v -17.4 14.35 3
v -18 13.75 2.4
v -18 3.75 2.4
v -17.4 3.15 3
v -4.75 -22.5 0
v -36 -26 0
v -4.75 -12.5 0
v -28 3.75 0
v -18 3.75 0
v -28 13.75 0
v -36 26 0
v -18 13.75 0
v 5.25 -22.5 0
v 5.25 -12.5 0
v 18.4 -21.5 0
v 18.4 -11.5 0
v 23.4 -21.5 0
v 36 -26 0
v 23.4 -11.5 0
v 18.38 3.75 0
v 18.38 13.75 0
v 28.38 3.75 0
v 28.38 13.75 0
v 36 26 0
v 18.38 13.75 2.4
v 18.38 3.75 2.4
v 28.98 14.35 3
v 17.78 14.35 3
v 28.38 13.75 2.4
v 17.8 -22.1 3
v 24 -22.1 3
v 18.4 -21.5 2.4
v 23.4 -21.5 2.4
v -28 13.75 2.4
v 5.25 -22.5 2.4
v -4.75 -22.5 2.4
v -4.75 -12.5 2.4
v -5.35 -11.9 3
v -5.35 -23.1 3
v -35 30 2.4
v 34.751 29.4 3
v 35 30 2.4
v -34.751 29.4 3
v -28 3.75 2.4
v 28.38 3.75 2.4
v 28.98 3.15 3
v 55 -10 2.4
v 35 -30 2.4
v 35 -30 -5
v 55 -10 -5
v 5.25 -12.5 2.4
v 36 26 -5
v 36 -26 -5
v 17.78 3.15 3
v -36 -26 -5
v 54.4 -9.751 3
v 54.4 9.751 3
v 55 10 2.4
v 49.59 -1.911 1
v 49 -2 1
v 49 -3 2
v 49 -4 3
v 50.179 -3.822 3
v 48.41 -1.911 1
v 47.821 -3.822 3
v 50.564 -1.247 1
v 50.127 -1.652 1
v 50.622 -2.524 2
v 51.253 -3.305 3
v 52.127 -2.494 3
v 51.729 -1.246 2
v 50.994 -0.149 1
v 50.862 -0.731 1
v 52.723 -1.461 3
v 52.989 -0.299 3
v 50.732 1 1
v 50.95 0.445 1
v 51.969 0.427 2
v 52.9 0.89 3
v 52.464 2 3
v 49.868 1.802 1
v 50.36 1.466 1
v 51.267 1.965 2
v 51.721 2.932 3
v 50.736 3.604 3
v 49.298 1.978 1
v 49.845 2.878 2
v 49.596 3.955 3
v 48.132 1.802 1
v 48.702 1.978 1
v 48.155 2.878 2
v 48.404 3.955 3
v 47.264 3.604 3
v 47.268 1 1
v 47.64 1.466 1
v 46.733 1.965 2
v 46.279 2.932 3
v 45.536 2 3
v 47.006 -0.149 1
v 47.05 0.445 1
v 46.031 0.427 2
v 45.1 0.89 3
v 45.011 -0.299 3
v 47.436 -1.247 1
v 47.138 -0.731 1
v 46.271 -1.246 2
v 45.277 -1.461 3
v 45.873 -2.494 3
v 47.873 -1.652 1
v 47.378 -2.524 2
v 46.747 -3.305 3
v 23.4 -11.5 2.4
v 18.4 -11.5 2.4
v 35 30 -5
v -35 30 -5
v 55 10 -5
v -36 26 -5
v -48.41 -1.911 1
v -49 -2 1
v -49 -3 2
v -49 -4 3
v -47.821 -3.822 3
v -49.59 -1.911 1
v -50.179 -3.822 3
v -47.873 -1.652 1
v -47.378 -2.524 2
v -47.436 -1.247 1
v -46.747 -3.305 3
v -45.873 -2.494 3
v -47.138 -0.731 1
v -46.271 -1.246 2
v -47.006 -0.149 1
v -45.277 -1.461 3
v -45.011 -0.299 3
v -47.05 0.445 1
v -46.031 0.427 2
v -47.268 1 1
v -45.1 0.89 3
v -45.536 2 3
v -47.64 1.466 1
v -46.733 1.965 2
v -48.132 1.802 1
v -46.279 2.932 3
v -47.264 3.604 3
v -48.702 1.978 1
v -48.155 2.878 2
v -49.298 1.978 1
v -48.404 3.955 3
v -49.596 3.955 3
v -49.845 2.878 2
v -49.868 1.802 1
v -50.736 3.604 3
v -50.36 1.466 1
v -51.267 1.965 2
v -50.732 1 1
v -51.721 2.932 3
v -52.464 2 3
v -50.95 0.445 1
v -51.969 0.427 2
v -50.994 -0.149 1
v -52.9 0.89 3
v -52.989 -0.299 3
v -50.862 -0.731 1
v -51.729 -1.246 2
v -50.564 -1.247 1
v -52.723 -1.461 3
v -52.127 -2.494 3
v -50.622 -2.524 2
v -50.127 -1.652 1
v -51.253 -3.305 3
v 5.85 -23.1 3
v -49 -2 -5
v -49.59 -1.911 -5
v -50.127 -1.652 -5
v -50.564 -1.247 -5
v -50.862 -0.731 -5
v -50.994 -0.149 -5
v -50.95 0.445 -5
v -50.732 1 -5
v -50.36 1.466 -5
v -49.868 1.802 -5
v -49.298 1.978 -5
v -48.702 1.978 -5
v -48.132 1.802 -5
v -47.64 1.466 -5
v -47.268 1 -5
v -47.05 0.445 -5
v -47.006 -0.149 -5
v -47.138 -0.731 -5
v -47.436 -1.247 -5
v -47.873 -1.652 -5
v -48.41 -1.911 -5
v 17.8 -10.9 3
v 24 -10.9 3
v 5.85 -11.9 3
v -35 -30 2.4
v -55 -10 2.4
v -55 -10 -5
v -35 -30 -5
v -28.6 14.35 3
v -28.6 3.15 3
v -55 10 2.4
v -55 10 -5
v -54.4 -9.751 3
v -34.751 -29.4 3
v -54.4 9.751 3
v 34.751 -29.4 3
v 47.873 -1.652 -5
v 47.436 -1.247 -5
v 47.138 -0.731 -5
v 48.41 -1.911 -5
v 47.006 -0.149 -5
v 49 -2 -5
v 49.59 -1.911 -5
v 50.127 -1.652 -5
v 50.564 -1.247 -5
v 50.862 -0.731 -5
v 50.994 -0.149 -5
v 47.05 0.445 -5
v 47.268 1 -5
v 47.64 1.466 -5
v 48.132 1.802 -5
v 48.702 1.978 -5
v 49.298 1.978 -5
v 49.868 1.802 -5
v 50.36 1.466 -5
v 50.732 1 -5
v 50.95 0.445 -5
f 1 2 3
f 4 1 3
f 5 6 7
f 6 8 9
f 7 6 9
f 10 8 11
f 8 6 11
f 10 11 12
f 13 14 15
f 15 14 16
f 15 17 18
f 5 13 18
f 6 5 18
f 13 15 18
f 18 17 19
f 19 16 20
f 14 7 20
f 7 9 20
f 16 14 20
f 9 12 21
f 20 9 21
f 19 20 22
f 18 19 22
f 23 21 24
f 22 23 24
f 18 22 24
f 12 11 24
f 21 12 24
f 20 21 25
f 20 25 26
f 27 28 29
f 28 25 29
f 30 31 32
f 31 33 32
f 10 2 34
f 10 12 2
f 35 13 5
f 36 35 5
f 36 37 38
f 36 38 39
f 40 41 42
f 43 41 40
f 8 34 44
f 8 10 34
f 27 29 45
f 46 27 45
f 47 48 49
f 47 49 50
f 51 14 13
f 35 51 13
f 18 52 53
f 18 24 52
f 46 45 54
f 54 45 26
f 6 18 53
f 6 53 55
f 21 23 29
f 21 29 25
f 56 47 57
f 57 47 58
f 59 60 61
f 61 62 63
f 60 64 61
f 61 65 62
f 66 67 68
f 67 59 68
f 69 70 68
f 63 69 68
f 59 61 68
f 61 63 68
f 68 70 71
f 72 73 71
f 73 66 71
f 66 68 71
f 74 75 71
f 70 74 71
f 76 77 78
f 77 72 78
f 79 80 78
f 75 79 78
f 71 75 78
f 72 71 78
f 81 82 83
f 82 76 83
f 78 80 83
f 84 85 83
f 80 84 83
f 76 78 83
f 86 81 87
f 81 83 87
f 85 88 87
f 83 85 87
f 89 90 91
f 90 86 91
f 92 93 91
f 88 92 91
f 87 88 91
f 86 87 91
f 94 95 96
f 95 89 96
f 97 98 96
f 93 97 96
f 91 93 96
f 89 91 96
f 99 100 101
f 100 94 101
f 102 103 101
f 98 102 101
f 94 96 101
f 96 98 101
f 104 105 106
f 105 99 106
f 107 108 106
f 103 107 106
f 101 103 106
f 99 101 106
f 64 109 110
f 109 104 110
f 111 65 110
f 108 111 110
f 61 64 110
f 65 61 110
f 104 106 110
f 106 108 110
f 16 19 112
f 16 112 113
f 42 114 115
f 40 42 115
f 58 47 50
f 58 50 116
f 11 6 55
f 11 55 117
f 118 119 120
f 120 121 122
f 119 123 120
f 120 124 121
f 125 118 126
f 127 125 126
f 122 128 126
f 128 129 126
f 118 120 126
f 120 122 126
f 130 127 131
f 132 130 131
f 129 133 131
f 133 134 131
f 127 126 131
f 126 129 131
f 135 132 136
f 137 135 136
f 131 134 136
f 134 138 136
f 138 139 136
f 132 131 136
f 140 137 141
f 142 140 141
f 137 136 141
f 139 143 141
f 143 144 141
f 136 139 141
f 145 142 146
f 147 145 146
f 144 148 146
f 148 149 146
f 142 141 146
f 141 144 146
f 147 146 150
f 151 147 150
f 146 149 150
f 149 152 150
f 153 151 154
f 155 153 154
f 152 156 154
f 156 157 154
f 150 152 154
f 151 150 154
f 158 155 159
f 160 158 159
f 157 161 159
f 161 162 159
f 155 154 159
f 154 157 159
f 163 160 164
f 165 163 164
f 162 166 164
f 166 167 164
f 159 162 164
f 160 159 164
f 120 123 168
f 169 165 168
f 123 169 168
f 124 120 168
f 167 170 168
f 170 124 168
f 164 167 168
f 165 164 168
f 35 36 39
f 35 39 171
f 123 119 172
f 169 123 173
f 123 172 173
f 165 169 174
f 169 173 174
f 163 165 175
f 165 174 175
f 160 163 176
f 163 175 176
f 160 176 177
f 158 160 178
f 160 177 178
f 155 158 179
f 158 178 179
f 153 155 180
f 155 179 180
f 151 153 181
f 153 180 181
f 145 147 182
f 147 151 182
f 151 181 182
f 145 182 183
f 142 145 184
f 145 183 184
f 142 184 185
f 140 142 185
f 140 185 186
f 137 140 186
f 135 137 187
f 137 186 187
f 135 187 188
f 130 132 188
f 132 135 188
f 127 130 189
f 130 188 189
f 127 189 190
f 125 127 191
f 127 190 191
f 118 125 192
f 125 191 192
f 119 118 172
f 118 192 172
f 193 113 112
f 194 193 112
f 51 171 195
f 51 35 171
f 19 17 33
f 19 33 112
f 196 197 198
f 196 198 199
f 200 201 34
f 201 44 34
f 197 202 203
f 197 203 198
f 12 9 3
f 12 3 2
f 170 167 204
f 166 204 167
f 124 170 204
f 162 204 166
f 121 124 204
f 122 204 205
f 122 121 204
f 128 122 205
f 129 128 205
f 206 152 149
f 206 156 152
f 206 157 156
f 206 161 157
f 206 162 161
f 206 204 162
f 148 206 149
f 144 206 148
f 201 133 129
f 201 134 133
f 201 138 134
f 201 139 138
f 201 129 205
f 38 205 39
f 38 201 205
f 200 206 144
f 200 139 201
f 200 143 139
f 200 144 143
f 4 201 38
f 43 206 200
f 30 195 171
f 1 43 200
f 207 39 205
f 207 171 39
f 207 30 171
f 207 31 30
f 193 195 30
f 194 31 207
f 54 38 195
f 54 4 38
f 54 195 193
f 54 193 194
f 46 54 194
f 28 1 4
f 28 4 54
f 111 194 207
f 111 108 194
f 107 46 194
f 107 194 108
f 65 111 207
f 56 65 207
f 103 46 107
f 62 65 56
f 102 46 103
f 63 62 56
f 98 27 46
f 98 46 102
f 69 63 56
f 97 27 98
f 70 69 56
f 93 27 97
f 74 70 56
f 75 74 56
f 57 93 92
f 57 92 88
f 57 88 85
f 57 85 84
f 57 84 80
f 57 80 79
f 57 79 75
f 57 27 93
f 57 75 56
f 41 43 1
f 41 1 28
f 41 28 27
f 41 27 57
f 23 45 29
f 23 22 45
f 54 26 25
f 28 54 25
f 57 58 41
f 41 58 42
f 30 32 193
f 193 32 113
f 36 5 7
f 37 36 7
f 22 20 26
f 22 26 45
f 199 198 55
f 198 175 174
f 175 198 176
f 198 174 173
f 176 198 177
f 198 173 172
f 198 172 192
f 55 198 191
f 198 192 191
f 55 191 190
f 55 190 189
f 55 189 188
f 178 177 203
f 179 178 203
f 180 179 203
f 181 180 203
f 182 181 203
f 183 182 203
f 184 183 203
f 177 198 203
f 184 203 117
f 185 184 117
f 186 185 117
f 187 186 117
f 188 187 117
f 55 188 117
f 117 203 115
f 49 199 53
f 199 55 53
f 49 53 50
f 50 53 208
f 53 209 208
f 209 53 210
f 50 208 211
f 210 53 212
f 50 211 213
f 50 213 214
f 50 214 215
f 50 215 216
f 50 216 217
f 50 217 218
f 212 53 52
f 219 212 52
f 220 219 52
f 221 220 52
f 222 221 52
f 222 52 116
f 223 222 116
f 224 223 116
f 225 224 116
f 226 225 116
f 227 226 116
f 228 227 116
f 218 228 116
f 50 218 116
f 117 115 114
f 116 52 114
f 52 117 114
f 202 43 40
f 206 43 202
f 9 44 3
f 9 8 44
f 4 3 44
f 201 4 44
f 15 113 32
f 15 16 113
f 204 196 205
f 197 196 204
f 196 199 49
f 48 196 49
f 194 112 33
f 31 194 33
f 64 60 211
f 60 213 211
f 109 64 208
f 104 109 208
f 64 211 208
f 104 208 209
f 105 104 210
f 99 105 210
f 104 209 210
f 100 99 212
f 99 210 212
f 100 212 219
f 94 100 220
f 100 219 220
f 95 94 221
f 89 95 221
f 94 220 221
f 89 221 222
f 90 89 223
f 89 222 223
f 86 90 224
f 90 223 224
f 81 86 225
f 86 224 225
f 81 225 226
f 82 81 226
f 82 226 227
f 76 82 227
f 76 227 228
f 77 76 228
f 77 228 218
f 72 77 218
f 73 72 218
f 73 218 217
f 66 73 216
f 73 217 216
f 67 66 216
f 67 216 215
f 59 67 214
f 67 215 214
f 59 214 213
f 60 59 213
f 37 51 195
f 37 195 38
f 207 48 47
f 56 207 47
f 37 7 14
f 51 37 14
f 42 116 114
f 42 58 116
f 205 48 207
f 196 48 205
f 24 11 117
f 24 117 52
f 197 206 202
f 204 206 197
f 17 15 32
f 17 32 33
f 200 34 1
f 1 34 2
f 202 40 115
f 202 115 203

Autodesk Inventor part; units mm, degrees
ref_plane "YZ Plane" through (0, 0, 0) normal (1, 0, 0) x (0, 1, 0)
ref_plane "XZ Plane" through (0, 0, 0) normal (0, 1, 0) x (-1, 0, 0)
ref_plane "XY Plane" through (0, 0, 0) normal (0, 0, 1) x (1, 0, 0)
sketch "Sketch1" plane through (0, 0, 0) normal (0, 0, 1) x (1, 0, 0)
  line L0 (-28, 3.75) -> (-18, 3.75)
  line L1 (-18, 3.75) -> (-18, 13.75)
  line L2 (-18, 13.75) -> (-28, 13.75)
  line L3 (-28, 13.75) -> (-28, 3.75)
  line L4 (-28, 3.75) -> (-18, 13.75) construction
  line L5 (-18, 3.75) -> (-28, 13.75) construction
  line L6 (18.38, 3.75) -> (28.38, 3.75)
  line L7 (28.38, 3.75) -> (28.38, 13.75)
  line L8 (28.38, 13.75) -> (18.38, 13.75)
  line L9 (18.38, 13.75) -> (18.38, 3.75)
  line L10 (18.38, 3.75) -> (28.38, 13.75) construction
  line L11 (28.38, 3.75) -> (18.38, 13.75) construction
  line L12 (-4.75, -12.5) -> (5.25, -12.5)
  line L13 (5.25, -12.5) -> (5.25, -22.5)
  line L14 (5.25, -22.5) -> (-4.75, -22.5)
  line L15 (-4.75, -22.5) -> (-4.75, -12.5)
  line L16 (-4.75, -12.5) -> (5.25, -22.5) construction
  line L17 (5.25, -12.5) -> (-4.75, -22.5) construction
  circle A0 centre (-23, 8.75) radius 1.925 construction
  circle A1 centre (23.38, 8.75) radius 1.925 construction
  circle A2 centre (0.25, -17.5) radius 1.925 construction
  line L18 (21.5954, -14.7725) -> (21.5954, -18.3725) construction
  line L19 (19.9954, -14.7725) -> (21.5954, -14.7725) construction
  line L20 (19.9954, -18.3725) -> (19.9954, -14.7725) construction
  line L21 (21.5954, -18.3725) -> (19.9954, -18.3725) construction
  line L22 (21.5454, -18.3225) -> (20.0454, -18.3225) construction
  line L23 (20.0454, -18.3225) -> (20.0454, -16.8225) construction
  line L24 (20.0454, -16.8225) -> (21.5454, -16.8225) construction
  line L25 (21.5454, -16.8225) -> (21.5454, -18.3225) construction
  line L26 (18.4, -21.5) -> (23.4, -21.5)
  line L27 (23.4, -21.5) -> (23.4, -11.5)
  line L28 (23.4, -11.5) -> (18.4, -11.5)
  line L29 (18.4, -11.5) -> (18.4, -21.5)
  line L30 (18.4, -21.5) -> (23.4, -11.5) construction
  line L31 (23.4, -21.5) -> (18.4, -11.5) construction
  circle A3 centre (22.55, -16.5) radius 0.45 construction
  circle A4 centre (19.25, -16.5) radius 0.45 construction
  line L32 (19.25, -16.5) -> (22.55, -16.5) construction
  line L33 (-45, -30) -> (45, -30)
  line L34 (45, -30) -> (45, 30)
  line L35 (45, 30) -> (-45, 30)
  line L36 (-45, 30) -> (-45, -30)
  line L37 (-45, -30) -> (45, 30) construction
  line L38 (45, -30) -> (-45, 30) construction
  line L39 (-30, 25) -> (30, 25) projected
  line L40 (35, 20) -> (35, -20) projected
  point P0 (0, 0)
  point P1 (23.38, 8.75)
  point P2 (0.25, -17.5)
  point P3 (20.9, -16.5)
  point P4 (20.9, -16.5)
  dimension "d0" = 10
  dimension "d3" = 5
  dimension "d4" = 10
  dimension "d5" = 10
  dimension "d6" = 5
extrude "Extrusion1" add sketch "Sketch1" along normal blind 3
sketch "Sketch2" plane through (0, 0, 0) normal (0, 0, -1) x (-1, 0, 0)
  line L0 (36, 26) -> (-36, 26)
  line L1 (-36, 26) -> (-36, -26)
  line L2 (-36, -26) -> (36, -26)
  line L3 (36, -26) -> (36, 26)
  line L4 (36, 26) -> (-36, -26) construction
  line L5 (-36, 26) -> (36, -26) construction
  line L6 (-30, -25) -> (30, -25) projected
  line L7 (35, -20) -> (35, 20) projected
  line L8 (-45, -30) -> (-45, 30) projected
  line L9 (45, -30) -> (-45, -30) projected
  line L10 (45, 30) -> (45, -30) projected
  line L11 (-45, 30) -> (45, 30) projected
  line L12 (-18.4, -21.5) -> (-18.4, -11.5) projected
  line L13 (-23.4, -21.5) -> (-18.4, -21.5) projected
  line L14 (-23.4, -11.5) -> (-23.4, -21.5) projected
  line L15 (-18.4, -11.5) -> (-23.4, -11.5) projected
  line L16 (4.75, -12.5) -> (-5.25, -12.5) projected
  line L17 (4.75, -22.5) -> (4.75, -12.5) projected
  line L18 (-5.25, -22.5) -> (4.75, -22.5) projected
  line L19 (-5.25, -12.5) -> (-5.25, -22.5) projected
  line L20 (-18.38, 3.75) -> (-18.38, 13.75) projected
  line L21 (-28.38, 3.75) -> (-18.38, 3.75) projected
  line L22 (-28.38, 13.75) -> (-28.38, 3.75) projected
  line L23 (-18.38, 13.75) -> (-28.38, 13.75) projected
  line L24 (28, 3.75) -> (28, 13.75) projected
  line L25 (18, 3.75) -> (28, 3.75) projected
  line L26 (18, 13.75) -> (18, 3.75) projected
  line L27 (28, 13.75) -> (18, 13.75) projected
  point P0 (0, 0)
  dimension "d9" = 1
  dimension "d10" = 1
extrude "Extrusion2" add sketch "Sketch2" along normal blind 5 contours L8 L11 L10 L9
chamfer "Chamfer1" distance 10 angle 45 4 edges at (-45, -30, -1) (45, -30, -1) (45, 30, -1) (-45, 30, -1)
sketch "Sketch3" plane through (0, 0, 3) normal (0, 0, 1) x (1, 0, 0)
  line L0 (45, -20) -> (45, 20) projected
  line L1 (45, -20) -> (55, -10)
  line L2 (55, -10) -> (55, 10)
  line L3 (55, 10) -> (45, 20)
  line L4 (45, -20) -> (35, -30) projected
  line L5 (35, 30) -> (45, 20) projected
  line L6 (-65, 0) -> (75, 0) construction
  point P0 (0, 0)
  point P1 (49, 0)
  dimension "d16" = 10
  dimension "d17" = 6
extrude "Extrusion3" add sketch "Sketch3" against normal up to surface (8 mm away)
hole "Hole1" at (49, 0, 3) direction (0, 0, -1) diameter 4 end through all countersink diameter 8 countersink angle 90
mirror "Mirror1" about plane through (0, 0, 0) normal (1, 0, 0) of "Extrusion3", "Hole1"
chamfer "Chamfer2" distance 0.6 angle 45 24 edges at (45, -20, 3) (55, 0, 3) (45, 20, 3) (0, 30, 3) (-45, 20, 3) (-55, 0, 3) (-45, -20, 3) (0, -30, 3) (-28, 8.75, 3) (-23, 3.75, 3) (-18, 8.75, 3) (-23, 13.75, 3) (23.38, 13.75, 3) (28.38, 8.75, 3) (23.38, 3.75, 3) (18.38, 8.75, 3) (20.9, -11.5, 3) (18.4, -16.5, 3) (20.9, -21.5, 3) (23.4, -16.5, 3) (5.25, -17.5, 3) (0.25, -22.5, 3) (-4.75, -17.5, 3) (0.25, -12.5, 3)
properties part number "_3DPrint"
